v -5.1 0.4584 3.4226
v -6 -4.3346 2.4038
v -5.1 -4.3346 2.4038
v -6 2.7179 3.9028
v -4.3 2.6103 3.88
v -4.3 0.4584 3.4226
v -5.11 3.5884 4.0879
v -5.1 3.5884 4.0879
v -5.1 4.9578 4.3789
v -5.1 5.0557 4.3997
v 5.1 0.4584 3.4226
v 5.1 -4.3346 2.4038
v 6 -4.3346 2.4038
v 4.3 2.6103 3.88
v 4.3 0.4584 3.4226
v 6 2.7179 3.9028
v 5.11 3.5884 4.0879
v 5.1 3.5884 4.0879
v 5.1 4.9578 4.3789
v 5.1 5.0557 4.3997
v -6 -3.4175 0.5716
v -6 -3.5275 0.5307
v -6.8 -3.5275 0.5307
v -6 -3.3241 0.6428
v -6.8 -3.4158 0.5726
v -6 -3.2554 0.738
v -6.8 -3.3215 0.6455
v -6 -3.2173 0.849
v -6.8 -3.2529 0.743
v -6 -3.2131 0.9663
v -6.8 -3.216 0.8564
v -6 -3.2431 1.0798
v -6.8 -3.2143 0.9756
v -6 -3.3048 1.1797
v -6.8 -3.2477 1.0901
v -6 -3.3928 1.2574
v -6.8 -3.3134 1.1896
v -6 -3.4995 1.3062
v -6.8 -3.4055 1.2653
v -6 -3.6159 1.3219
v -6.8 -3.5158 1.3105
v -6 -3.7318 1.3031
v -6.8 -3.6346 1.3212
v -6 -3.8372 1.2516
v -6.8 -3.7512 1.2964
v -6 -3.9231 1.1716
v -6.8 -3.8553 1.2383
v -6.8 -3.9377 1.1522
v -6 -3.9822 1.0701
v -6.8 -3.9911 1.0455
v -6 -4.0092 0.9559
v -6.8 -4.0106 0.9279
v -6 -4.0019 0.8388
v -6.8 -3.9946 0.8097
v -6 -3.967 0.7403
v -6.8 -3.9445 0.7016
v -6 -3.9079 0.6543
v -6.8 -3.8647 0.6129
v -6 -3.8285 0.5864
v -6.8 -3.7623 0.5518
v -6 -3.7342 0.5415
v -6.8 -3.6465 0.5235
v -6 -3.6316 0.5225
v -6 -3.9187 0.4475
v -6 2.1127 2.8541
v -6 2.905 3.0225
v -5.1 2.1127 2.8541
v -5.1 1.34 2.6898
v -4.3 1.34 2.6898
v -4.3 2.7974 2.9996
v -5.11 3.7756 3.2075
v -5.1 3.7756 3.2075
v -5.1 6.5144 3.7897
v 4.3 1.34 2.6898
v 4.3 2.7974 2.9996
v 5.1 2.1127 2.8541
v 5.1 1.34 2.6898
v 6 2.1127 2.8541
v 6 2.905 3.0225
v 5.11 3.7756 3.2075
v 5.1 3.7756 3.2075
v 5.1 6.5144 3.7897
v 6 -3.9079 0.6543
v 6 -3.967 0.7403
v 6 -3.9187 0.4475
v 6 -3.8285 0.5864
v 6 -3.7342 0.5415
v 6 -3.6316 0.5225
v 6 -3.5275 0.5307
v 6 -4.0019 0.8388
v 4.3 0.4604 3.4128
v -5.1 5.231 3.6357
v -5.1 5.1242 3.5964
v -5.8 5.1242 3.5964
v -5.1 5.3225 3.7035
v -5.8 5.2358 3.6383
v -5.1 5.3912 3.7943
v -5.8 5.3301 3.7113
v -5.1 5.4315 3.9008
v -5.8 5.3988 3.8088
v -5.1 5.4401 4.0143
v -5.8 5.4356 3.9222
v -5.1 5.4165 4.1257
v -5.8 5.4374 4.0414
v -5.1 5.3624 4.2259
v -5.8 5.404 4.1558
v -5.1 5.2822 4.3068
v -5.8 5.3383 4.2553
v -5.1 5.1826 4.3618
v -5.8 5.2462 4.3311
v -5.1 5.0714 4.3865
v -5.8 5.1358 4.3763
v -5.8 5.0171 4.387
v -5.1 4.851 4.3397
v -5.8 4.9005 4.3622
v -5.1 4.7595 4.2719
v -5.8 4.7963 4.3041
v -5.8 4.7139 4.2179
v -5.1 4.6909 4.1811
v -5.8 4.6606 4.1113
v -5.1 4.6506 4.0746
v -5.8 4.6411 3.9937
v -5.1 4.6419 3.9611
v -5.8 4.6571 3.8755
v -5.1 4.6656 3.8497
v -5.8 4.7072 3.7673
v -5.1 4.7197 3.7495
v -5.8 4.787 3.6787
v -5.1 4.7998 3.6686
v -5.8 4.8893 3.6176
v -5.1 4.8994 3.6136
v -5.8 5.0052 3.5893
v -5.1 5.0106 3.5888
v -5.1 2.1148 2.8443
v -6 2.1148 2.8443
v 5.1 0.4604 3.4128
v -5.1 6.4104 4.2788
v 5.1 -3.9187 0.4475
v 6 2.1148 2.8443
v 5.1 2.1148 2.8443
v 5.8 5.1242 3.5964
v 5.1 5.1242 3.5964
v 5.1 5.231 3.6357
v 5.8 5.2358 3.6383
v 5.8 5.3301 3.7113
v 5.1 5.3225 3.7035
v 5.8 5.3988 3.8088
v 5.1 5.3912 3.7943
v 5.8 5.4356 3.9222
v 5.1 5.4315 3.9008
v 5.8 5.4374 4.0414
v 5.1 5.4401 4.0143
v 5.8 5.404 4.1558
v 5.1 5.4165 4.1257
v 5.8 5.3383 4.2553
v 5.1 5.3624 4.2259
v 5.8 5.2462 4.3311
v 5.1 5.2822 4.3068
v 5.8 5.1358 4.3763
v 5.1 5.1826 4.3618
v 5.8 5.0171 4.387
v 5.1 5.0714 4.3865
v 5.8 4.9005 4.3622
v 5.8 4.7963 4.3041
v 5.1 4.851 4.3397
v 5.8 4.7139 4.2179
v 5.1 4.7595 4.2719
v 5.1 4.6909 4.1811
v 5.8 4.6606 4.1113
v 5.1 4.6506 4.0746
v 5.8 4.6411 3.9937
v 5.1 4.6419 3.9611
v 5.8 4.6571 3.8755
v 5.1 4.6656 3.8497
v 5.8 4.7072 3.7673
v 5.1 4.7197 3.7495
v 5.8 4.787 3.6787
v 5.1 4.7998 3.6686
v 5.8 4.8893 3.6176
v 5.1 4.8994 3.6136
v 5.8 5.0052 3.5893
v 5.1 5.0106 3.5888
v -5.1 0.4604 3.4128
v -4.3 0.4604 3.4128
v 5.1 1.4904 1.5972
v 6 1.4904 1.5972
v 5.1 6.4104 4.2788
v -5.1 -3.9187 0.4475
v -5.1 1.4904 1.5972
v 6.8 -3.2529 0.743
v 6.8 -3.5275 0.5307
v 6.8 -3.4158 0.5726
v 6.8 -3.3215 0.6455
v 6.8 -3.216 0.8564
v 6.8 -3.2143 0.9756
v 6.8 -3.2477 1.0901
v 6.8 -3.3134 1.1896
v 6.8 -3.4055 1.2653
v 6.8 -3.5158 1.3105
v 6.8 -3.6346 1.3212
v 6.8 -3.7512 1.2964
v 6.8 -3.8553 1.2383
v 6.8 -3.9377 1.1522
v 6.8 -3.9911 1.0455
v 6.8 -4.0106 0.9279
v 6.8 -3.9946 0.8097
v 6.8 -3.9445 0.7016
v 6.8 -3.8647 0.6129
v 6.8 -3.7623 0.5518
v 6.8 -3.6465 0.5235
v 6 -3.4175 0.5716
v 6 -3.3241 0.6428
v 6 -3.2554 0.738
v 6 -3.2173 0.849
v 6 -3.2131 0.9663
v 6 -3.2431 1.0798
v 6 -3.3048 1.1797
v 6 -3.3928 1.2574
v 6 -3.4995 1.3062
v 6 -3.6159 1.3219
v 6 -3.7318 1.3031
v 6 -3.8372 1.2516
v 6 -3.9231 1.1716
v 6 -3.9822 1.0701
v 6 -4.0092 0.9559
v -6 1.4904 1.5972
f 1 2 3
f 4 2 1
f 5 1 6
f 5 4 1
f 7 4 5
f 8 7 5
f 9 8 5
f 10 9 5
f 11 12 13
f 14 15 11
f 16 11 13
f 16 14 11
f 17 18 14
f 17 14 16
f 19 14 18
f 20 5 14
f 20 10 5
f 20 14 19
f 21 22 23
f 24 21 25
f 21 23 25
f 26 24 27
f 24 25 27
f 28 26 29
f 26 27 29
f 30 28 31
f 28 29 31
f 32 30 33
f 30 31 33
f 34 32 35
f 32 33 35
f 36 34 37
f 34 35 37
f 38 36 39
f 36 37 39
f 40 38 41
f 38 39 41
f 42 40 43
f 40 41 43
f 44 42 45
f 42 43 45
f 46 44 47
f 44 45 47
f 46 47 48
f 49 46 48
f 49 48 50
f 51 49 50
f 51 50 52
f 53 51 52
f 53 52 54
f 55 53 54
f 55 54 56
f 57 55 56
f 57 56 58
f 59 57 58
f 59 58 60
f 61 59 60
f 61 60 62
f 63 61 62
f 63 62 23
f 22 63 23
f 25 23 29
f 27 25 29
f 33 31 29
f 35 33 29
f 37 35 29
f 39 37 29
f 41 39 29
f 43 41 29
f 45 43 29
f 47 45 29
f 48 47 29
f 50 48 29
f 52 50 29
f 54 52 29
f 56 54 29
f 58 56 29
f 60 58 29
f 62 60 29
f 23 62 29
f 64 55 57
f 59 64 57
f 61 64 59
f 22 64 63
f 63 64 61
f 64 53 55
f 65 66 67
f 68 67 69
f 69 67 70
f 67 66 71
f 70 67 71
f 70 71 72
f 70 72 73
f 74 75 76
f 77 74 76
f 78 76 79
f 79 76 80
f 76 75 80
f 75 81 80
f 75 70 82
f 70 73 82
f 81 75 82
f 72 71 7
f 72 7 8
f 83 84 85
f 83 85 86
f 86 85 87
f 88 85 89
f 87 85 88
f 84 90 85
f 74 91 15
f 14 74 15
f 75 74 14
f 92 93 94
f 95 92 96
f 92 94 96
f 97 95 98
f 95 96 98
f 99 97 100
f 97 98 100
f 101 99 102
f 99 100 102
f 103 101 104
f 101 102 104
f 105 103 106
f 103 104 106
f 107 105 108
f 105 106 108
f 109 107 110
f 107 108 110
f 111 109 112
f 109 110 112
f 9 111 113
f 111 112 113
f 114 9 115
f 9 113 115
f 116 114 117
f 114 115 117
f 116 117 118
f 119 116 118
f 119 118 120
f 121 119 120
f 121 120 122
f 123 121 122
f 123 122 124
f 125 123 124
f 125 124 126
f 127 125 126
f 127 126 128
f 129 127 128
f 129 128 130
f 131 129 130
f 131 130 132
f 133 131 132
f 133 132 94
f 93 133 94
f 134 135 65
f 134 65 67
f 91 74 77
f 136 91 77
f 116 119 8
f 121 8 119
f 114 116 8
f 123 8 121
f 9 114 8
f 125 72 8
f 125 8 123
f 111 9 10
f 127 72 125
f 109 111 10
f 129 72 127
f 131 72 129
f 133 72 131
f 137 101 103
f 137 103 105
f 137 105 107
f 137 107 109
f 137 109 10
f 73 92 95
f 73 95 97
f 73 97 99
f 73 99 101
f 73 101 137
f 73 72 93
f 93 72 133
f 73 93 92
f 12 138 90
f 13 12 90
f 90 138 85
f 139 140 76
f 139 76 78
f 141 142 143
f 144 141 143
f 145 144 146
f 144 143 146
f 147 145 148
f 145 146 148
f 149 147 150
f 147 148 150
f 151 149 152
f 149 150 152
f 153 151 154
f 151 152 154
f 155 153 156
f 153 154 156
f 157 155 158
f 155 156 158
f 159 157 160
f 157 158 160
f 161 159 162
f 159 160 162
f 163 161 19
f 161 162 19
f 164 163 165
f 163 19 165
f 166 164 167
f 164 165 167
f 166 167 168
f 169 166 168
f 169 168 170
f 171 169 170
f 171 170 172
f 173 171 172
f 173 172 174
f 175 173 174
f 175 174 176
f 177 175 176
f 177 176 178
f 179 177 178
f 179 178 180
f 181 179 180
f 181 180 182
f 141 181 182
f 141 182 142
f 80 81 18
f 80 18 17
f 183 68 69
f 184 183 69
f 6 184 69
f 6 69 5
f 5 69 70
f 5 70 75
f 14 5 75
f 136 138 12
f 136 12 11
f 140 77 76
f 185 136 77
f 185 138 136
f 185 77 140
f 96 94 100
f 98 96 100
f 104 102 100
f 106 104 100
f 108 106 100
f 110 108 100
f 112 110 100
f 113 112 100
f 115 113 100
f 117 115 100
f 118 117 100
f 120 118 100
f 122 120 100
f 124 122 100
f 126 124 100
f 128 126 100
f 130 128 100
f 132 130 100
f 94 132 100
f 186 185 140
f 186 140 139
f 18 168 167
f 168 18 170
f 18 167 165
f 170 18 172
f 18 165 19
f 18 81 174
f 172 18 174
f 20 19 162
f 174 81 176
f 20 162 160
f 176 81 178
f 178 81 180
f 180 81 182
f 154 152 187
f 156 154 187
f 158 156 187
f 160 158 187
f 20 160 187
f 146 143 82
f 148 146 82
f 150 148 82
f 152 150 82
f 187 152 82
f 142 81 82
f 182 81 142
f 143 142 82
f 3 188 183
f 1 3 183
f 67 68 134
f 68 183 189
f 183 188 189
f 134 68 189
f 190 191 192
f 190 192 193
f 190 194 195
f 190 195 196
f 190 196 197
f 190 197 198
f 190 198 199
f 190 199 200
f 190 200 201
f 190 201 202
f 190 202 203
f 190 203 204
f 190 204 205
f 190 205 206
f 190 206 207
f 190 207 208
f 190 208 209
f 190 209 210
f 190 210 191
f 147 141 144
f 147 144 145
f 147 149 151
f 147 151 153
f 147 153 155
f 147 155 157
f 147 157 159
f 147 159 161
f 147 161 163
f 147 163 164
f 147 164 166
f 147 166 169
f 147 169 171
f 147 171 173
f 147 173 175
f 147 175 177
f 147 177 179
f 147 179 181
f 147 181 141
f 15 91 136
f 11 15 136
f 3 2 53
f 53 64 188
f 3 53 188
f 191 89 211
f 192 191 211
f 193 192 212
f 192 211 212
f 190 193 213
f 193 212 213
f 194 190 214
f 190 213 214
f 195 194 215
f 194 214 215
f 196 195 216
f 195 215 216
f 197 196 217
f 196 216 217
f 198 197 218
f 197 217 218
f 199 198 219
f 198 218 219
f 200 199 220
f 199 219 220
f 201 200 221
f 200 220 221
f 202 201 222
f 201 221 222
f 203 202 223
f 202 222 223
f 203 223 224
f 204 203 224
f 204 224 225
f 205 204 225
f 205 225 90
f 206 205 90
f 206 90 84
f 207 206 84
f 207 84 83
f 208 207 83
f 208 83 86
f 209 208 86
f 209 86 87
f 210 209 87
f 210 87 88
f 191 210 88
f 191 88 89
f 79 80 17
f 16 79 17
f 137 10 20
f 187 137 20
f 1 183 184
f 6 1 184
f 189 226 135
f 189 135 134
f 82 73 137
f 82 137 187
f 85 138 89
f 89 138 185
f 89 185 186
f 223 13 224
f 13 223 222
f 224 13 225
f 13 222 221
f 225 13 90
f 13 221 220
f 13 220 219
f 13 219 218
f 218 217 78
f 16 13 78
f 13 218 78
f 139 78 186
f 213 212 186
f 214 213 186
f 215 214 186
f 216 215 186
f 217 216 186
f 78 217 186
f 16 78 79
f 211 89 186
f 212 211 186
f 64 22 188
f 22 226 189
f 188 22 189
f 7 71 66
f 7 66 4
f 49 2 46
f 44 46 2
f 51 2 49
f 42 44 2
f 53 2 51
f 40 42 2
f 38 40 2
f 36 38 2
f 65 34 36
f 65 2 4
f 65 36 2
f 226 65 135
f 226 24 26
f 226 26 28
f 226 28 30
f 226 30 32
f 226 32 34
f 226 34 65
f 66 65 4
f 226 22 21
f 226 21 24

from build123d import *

# Parameters (mm, degrees)
BOX051_W                  = 0.9
BOX051_H                  = 8.1
BOX051_DEPTH              = 0.9
CHAMFER035_SIZE           = 0.89
BOX052_W                  = 0.9
BOX052_H                  = 8.1
BOX052_DEPTH              = 0.9
CHAMFER036_SIZE           = 0.89
BOX053_W                  = 0.8
BOX053_H                  = 2.2
BOX053_DEPTH              = 0.9
CHAMFER037_SIZE2          = 0.71
CHAMFER037_SIZE           = 0.89
BOX054_W                  = 0.8
BOX054_H                  = 2.2
BOX054_DEPTH              = 0.9
CHAMFER038_SIZE2          = 0.71
CHAMFER038_SIZE           = 0.89
BOX062_W                  = 0.9
BOX062_H                  = 6.4
BOX062_DEPTH              = 1.1
CHAMFER039_SIZE2          = 0.87
CHAMFER039_SIZE           = 1.09
BOX063_W                  = 0.9
BOX063_H                  = 6.4
BOX063_DEPTH              = 1.1
CHAMFER040_SIZE2          = 0.87
CHAMFER040_SIZE           = 1.09
CYLINDER017_R             = 0.4
CYLINDER017_DEPTH         = 0.8
CYLINDER018_R             = 0.4
CYLINDER018_DEPTH         = 0.8
CYLINDER019_R             = 0.4
CYLINDER019_DEPTH         = 0.7
CYLINDER020_R             = 0.4
CYLINDER020_DEPTH         = 0.7
BOX050_W                  = 10.2
BOX050_H                  = 3.8
BOX050_DEPTH              = 0.9
CHAMFER034_SIZE2          = 1.3
CHAMFER034_SIZE           = 0.4
FUSION015_PLACEMENT_ANGLE = 12


with BuildPart() as pg1425_backshaftcham002:
    # Box051 → Box051 (new body)
    with BuildSketch(Plane(origin=(-6, -3.9, 1.6), x_dir=(1, 0, 0), z_dir=(0, 0, 1))):
        with Locations((0.45, 4.05)):
            Rectangle(BOX051_W, BOX051_H)
    extrude(amount=BOX051_DEPTH)

    # Chamfer035
    chamfer035_edges = [pg1425_backshaftcham002.edges().sort_by_distance(p)[0] for p in [
        (-6, 4.2, 2.05),
    ]]
    chamfer(chamfer035_edges, length=CHAMFER035_SIZE)


with BuildPart() as pg1425_backshaftcham003:
    # Box052 → Box052 (new body)
    with BuildSketch(Plane(origin=(5.1, -3.9, 1.6), x_dir=(1, 0, 0), z_dir=(0, 0, 1))):
        with Locations((0.45, 4.05)):
            Rectangle(BOX052_W, BOX052_H)
    extrude(amount=BOX052_DEPTH)

    # Chamfer036
    chamfer036_edges = [pg1425_backshaftcham003.edges().sort_by_distance(p)[0] for p in [
        (6, 4.2, 2.05),
    ]]
    chamfer(chamfer036_edges, length=CHAMFER036_SIZE)


with BuildPart() as pg1425_backshaftcham004:
    # Box053 → Box053 (new body)
    with BuildSketch(Plane(origin=(-5.1, 1, 1.6), x_dir=(1, 0, 0), z_dir=(0, 0, 1))):
        with Locations((0.4, 1.1)):
            Rectangle(BOX053_W, BOX053_H)
    extrude(amount=BOX053_DEPTH)

    # Chamfer037
    chamfer037_edges = [pg1425_backshaftcham004.edges().sort_by_distance(p)[0] for p in [
        (-4.7, 1, 1.6),
    ]]
    chamfer037_side = pg1425_backshaftcham004.faces().sort_by_distance((-4.7, 1, 2.05))[0]
    chamfer(chamfer037_edges, length=CHAMFER037_SIZE, length2=CHAMFER037_SIZE2, reference=chamfer037_side)


with BuildPart() as pg1425_backshaftcham005:
    # Box054 → Box054 (new body)
    with BuildSketch(Plane(origin=(4.3, 1, 1.6), x_dir=(1, 0, 0), z_dir=(0, 0, 1))):
        with Locations((0.4, 1.1)):
            Rectangle(BOX054_W, BOX054_H)
    extrude(amount=BOX054_DEPTH)

    # Chamfer038
    chamfer038_edges = [pg1425_backshaftcham005.edges().sort_by_distance(p)[0] for p in [
        (4.7, 1, 1.6),
    ]]
    chamfer038_side = pg1425_backshaftcham005.faces().sort_by_distance((4.7, 1, 2.05))[0]
    chamfer(chamfer038_edges, length=CHAMFER038_SIZE, length2=CHAMFER038_SIZE2, reference=chamfer038_side)


with BuildPart() as pg1425_backshaftcham006:
    # Box062 → Box062 (new body)
    with BuildSketch(Plane(origin=(-6, -3.9, 0.5), x_dir=(1, 0, 0), z_dir=(0, 0, 1))):
        with Locations((0.45, 3.2)):
            Rectangle(BOX062_W, BOX062_H)
    extrude(amount=BOX062_DEPTH)

    # Chamfer039
    chamfer039_edges = [pg1425_backshaftcham006.edges().sort_by_distance(p)[0] for p in [
        (-5.55, 2.5, 0.5),
    ]]
    chamfer039_side = pg1425_backshaftcham006.faces().sort_by_distance((-5.55, 2.5, 1.05))[0]
    chamfer(chamfer039_edges, length=CHAMFER039_SIZE, length2=CHAMFER039_SIZE2, reference=chamfer039_side)


with BuildPart() as pg1425_backshaftcham007:
    # Box063 → Box063 (new body)
    with BuildSketch(Plane(origin=(5.1, -3.9, 0.5), x_dir=(1, 0, 0), z_dir=(0, 0, 1))):
        with Locations((0.45, 3.2)):
            Rectangle(BOX063_W, BOX063_H)
    extrude(amount=BOX063_DEPTH)

    # Chamfer040
    chamfer040_edges = [pg1425_backshaftcham007.edges().sort_by_distance(p)[0] for p in [
        (5.55, 2.5, 0.5),
    ]]
    chamfer040_side = pg1425_backshaftcham007.faces().sort_by_distance((5.55, 2.5, 1.05))[0]
    chamfer(chamfer040_edges, length=CHAMFER040_SIZE, length2=CHAMFER040_SIZE2, reference=chamfer040_side)


with BuildPart() as pg1425_backshaft008:
    # Cylinder017 → Cylinder017 (new body)
    with BuildSketch(Plane(origin=(-6.8, -3.5, 0.9), x_dir=(0, 0, -1), z_dir=(1, 0, 0))):
        Circle(CYLINDER017_R)
    extrude(amount=CYLINDER017_DEPTH)


with BuildPart() as pg1425_backshaft009:
    # Cylinder018 → Cylinder018 (new body)
    with BuildSketch(Plane(origin=(6, -3.5, 0.9), x_dir=(0, 0, -1), z_dir=(1, 0, 0))):
        Circle(CYLINDER018_R)
    extrude(amount=CYLINDER018_DEPTH)


with BuildPart() as pg1425_backshaft010:
    # Cylinder019 → Cylinder019 (new body)
    with BuildSketch(Plane(origin=(-5.8, 5.6, 2.1), x_dir=(0, 0, -1), z_dir=(1, 0, 0))):
        Circle(CYLINDER019_R)
    extrude(amount=CYLINDER019_DEPTH)


with BuildPart() as pg1425_backshaft011:
    # Cylinder020 → Cylinder020 (new body)
    with BuildSketch(Plane(origin=(5.1, 5.6, 2.1), x_dir=(0, 0, -1), z_dir=(1, 0, 0))):
        Circle(CYLINDER020_R)
    extrude(amount=CYLINDER020_DEPTH)


with BuildPart() as pg1425_backshaft:
    # Box050 → Box050 (new body)
    with BuildSketch(Plane(origin=(-5.1, 3.2, 1.6), x_dir=(1, 0, 0), z_dir=(0, 0, 1))):
        with Locations((5.1, 1.9)):
            Rectangle(BOX050_W, BOX050_H)
    extrude(amount=BOX050_DEPTH)

    # Chamfer034
    chamfer034_edges = [pg1425_backshaft.edges().sort_by_distance(p)[0] for p in [
        (0, 7, 2.5),
    ]]
    chamfer034_side = pg1425_backshaft.faces().sort_by_distance((0, 7, 2.05))[0]
    chamfer(chamfer034_edges, length=CHAMFER034_SIZE, length2=CHAMFER034_SIZE2, reference=chamfer034_side)

    # Fusion015: union PG1425_BackShaftCham002, PG1425_BackShaftCham003, PG1425_BackShaftCham004, PG1425_BackShaftCham005, PG1425_BackShaftCham006, PG1425_BackShaftCham007, PG1425_BackShaft008, PG1425_BackShaft009, PG1425_BackShaft010, PG1425_BackShaft011
    add(pg1425_backshaftcham002.part)
    add(pg1425_backshaftcham003.part)
    add(pg1425_backshaftcham004.part)
    add(pg1425_backshaftcham005.part)
    add(pg1425_backshaftcham006.part)
    add(pg1425_backshaftcham007.part)
    add(pg1425_backshaft008.part)
    add(pg1425_backshaft009.part)
    add(pg1425_backshaft010.part)
    add(pg1425_backshaft011.part)


with BuildPart() as pg1425_backshaft_1:
    # Fusion015 placement: moved
    add(pg1425_backshaft.part.moved(Location((0, 0, 0.769273))).rotate(Axis((0, 0, 0.769273), (1, 0, 0)), FUSION015_PLACEMENT_ANGLE))


solid = pg1425_backshaft_1.part
